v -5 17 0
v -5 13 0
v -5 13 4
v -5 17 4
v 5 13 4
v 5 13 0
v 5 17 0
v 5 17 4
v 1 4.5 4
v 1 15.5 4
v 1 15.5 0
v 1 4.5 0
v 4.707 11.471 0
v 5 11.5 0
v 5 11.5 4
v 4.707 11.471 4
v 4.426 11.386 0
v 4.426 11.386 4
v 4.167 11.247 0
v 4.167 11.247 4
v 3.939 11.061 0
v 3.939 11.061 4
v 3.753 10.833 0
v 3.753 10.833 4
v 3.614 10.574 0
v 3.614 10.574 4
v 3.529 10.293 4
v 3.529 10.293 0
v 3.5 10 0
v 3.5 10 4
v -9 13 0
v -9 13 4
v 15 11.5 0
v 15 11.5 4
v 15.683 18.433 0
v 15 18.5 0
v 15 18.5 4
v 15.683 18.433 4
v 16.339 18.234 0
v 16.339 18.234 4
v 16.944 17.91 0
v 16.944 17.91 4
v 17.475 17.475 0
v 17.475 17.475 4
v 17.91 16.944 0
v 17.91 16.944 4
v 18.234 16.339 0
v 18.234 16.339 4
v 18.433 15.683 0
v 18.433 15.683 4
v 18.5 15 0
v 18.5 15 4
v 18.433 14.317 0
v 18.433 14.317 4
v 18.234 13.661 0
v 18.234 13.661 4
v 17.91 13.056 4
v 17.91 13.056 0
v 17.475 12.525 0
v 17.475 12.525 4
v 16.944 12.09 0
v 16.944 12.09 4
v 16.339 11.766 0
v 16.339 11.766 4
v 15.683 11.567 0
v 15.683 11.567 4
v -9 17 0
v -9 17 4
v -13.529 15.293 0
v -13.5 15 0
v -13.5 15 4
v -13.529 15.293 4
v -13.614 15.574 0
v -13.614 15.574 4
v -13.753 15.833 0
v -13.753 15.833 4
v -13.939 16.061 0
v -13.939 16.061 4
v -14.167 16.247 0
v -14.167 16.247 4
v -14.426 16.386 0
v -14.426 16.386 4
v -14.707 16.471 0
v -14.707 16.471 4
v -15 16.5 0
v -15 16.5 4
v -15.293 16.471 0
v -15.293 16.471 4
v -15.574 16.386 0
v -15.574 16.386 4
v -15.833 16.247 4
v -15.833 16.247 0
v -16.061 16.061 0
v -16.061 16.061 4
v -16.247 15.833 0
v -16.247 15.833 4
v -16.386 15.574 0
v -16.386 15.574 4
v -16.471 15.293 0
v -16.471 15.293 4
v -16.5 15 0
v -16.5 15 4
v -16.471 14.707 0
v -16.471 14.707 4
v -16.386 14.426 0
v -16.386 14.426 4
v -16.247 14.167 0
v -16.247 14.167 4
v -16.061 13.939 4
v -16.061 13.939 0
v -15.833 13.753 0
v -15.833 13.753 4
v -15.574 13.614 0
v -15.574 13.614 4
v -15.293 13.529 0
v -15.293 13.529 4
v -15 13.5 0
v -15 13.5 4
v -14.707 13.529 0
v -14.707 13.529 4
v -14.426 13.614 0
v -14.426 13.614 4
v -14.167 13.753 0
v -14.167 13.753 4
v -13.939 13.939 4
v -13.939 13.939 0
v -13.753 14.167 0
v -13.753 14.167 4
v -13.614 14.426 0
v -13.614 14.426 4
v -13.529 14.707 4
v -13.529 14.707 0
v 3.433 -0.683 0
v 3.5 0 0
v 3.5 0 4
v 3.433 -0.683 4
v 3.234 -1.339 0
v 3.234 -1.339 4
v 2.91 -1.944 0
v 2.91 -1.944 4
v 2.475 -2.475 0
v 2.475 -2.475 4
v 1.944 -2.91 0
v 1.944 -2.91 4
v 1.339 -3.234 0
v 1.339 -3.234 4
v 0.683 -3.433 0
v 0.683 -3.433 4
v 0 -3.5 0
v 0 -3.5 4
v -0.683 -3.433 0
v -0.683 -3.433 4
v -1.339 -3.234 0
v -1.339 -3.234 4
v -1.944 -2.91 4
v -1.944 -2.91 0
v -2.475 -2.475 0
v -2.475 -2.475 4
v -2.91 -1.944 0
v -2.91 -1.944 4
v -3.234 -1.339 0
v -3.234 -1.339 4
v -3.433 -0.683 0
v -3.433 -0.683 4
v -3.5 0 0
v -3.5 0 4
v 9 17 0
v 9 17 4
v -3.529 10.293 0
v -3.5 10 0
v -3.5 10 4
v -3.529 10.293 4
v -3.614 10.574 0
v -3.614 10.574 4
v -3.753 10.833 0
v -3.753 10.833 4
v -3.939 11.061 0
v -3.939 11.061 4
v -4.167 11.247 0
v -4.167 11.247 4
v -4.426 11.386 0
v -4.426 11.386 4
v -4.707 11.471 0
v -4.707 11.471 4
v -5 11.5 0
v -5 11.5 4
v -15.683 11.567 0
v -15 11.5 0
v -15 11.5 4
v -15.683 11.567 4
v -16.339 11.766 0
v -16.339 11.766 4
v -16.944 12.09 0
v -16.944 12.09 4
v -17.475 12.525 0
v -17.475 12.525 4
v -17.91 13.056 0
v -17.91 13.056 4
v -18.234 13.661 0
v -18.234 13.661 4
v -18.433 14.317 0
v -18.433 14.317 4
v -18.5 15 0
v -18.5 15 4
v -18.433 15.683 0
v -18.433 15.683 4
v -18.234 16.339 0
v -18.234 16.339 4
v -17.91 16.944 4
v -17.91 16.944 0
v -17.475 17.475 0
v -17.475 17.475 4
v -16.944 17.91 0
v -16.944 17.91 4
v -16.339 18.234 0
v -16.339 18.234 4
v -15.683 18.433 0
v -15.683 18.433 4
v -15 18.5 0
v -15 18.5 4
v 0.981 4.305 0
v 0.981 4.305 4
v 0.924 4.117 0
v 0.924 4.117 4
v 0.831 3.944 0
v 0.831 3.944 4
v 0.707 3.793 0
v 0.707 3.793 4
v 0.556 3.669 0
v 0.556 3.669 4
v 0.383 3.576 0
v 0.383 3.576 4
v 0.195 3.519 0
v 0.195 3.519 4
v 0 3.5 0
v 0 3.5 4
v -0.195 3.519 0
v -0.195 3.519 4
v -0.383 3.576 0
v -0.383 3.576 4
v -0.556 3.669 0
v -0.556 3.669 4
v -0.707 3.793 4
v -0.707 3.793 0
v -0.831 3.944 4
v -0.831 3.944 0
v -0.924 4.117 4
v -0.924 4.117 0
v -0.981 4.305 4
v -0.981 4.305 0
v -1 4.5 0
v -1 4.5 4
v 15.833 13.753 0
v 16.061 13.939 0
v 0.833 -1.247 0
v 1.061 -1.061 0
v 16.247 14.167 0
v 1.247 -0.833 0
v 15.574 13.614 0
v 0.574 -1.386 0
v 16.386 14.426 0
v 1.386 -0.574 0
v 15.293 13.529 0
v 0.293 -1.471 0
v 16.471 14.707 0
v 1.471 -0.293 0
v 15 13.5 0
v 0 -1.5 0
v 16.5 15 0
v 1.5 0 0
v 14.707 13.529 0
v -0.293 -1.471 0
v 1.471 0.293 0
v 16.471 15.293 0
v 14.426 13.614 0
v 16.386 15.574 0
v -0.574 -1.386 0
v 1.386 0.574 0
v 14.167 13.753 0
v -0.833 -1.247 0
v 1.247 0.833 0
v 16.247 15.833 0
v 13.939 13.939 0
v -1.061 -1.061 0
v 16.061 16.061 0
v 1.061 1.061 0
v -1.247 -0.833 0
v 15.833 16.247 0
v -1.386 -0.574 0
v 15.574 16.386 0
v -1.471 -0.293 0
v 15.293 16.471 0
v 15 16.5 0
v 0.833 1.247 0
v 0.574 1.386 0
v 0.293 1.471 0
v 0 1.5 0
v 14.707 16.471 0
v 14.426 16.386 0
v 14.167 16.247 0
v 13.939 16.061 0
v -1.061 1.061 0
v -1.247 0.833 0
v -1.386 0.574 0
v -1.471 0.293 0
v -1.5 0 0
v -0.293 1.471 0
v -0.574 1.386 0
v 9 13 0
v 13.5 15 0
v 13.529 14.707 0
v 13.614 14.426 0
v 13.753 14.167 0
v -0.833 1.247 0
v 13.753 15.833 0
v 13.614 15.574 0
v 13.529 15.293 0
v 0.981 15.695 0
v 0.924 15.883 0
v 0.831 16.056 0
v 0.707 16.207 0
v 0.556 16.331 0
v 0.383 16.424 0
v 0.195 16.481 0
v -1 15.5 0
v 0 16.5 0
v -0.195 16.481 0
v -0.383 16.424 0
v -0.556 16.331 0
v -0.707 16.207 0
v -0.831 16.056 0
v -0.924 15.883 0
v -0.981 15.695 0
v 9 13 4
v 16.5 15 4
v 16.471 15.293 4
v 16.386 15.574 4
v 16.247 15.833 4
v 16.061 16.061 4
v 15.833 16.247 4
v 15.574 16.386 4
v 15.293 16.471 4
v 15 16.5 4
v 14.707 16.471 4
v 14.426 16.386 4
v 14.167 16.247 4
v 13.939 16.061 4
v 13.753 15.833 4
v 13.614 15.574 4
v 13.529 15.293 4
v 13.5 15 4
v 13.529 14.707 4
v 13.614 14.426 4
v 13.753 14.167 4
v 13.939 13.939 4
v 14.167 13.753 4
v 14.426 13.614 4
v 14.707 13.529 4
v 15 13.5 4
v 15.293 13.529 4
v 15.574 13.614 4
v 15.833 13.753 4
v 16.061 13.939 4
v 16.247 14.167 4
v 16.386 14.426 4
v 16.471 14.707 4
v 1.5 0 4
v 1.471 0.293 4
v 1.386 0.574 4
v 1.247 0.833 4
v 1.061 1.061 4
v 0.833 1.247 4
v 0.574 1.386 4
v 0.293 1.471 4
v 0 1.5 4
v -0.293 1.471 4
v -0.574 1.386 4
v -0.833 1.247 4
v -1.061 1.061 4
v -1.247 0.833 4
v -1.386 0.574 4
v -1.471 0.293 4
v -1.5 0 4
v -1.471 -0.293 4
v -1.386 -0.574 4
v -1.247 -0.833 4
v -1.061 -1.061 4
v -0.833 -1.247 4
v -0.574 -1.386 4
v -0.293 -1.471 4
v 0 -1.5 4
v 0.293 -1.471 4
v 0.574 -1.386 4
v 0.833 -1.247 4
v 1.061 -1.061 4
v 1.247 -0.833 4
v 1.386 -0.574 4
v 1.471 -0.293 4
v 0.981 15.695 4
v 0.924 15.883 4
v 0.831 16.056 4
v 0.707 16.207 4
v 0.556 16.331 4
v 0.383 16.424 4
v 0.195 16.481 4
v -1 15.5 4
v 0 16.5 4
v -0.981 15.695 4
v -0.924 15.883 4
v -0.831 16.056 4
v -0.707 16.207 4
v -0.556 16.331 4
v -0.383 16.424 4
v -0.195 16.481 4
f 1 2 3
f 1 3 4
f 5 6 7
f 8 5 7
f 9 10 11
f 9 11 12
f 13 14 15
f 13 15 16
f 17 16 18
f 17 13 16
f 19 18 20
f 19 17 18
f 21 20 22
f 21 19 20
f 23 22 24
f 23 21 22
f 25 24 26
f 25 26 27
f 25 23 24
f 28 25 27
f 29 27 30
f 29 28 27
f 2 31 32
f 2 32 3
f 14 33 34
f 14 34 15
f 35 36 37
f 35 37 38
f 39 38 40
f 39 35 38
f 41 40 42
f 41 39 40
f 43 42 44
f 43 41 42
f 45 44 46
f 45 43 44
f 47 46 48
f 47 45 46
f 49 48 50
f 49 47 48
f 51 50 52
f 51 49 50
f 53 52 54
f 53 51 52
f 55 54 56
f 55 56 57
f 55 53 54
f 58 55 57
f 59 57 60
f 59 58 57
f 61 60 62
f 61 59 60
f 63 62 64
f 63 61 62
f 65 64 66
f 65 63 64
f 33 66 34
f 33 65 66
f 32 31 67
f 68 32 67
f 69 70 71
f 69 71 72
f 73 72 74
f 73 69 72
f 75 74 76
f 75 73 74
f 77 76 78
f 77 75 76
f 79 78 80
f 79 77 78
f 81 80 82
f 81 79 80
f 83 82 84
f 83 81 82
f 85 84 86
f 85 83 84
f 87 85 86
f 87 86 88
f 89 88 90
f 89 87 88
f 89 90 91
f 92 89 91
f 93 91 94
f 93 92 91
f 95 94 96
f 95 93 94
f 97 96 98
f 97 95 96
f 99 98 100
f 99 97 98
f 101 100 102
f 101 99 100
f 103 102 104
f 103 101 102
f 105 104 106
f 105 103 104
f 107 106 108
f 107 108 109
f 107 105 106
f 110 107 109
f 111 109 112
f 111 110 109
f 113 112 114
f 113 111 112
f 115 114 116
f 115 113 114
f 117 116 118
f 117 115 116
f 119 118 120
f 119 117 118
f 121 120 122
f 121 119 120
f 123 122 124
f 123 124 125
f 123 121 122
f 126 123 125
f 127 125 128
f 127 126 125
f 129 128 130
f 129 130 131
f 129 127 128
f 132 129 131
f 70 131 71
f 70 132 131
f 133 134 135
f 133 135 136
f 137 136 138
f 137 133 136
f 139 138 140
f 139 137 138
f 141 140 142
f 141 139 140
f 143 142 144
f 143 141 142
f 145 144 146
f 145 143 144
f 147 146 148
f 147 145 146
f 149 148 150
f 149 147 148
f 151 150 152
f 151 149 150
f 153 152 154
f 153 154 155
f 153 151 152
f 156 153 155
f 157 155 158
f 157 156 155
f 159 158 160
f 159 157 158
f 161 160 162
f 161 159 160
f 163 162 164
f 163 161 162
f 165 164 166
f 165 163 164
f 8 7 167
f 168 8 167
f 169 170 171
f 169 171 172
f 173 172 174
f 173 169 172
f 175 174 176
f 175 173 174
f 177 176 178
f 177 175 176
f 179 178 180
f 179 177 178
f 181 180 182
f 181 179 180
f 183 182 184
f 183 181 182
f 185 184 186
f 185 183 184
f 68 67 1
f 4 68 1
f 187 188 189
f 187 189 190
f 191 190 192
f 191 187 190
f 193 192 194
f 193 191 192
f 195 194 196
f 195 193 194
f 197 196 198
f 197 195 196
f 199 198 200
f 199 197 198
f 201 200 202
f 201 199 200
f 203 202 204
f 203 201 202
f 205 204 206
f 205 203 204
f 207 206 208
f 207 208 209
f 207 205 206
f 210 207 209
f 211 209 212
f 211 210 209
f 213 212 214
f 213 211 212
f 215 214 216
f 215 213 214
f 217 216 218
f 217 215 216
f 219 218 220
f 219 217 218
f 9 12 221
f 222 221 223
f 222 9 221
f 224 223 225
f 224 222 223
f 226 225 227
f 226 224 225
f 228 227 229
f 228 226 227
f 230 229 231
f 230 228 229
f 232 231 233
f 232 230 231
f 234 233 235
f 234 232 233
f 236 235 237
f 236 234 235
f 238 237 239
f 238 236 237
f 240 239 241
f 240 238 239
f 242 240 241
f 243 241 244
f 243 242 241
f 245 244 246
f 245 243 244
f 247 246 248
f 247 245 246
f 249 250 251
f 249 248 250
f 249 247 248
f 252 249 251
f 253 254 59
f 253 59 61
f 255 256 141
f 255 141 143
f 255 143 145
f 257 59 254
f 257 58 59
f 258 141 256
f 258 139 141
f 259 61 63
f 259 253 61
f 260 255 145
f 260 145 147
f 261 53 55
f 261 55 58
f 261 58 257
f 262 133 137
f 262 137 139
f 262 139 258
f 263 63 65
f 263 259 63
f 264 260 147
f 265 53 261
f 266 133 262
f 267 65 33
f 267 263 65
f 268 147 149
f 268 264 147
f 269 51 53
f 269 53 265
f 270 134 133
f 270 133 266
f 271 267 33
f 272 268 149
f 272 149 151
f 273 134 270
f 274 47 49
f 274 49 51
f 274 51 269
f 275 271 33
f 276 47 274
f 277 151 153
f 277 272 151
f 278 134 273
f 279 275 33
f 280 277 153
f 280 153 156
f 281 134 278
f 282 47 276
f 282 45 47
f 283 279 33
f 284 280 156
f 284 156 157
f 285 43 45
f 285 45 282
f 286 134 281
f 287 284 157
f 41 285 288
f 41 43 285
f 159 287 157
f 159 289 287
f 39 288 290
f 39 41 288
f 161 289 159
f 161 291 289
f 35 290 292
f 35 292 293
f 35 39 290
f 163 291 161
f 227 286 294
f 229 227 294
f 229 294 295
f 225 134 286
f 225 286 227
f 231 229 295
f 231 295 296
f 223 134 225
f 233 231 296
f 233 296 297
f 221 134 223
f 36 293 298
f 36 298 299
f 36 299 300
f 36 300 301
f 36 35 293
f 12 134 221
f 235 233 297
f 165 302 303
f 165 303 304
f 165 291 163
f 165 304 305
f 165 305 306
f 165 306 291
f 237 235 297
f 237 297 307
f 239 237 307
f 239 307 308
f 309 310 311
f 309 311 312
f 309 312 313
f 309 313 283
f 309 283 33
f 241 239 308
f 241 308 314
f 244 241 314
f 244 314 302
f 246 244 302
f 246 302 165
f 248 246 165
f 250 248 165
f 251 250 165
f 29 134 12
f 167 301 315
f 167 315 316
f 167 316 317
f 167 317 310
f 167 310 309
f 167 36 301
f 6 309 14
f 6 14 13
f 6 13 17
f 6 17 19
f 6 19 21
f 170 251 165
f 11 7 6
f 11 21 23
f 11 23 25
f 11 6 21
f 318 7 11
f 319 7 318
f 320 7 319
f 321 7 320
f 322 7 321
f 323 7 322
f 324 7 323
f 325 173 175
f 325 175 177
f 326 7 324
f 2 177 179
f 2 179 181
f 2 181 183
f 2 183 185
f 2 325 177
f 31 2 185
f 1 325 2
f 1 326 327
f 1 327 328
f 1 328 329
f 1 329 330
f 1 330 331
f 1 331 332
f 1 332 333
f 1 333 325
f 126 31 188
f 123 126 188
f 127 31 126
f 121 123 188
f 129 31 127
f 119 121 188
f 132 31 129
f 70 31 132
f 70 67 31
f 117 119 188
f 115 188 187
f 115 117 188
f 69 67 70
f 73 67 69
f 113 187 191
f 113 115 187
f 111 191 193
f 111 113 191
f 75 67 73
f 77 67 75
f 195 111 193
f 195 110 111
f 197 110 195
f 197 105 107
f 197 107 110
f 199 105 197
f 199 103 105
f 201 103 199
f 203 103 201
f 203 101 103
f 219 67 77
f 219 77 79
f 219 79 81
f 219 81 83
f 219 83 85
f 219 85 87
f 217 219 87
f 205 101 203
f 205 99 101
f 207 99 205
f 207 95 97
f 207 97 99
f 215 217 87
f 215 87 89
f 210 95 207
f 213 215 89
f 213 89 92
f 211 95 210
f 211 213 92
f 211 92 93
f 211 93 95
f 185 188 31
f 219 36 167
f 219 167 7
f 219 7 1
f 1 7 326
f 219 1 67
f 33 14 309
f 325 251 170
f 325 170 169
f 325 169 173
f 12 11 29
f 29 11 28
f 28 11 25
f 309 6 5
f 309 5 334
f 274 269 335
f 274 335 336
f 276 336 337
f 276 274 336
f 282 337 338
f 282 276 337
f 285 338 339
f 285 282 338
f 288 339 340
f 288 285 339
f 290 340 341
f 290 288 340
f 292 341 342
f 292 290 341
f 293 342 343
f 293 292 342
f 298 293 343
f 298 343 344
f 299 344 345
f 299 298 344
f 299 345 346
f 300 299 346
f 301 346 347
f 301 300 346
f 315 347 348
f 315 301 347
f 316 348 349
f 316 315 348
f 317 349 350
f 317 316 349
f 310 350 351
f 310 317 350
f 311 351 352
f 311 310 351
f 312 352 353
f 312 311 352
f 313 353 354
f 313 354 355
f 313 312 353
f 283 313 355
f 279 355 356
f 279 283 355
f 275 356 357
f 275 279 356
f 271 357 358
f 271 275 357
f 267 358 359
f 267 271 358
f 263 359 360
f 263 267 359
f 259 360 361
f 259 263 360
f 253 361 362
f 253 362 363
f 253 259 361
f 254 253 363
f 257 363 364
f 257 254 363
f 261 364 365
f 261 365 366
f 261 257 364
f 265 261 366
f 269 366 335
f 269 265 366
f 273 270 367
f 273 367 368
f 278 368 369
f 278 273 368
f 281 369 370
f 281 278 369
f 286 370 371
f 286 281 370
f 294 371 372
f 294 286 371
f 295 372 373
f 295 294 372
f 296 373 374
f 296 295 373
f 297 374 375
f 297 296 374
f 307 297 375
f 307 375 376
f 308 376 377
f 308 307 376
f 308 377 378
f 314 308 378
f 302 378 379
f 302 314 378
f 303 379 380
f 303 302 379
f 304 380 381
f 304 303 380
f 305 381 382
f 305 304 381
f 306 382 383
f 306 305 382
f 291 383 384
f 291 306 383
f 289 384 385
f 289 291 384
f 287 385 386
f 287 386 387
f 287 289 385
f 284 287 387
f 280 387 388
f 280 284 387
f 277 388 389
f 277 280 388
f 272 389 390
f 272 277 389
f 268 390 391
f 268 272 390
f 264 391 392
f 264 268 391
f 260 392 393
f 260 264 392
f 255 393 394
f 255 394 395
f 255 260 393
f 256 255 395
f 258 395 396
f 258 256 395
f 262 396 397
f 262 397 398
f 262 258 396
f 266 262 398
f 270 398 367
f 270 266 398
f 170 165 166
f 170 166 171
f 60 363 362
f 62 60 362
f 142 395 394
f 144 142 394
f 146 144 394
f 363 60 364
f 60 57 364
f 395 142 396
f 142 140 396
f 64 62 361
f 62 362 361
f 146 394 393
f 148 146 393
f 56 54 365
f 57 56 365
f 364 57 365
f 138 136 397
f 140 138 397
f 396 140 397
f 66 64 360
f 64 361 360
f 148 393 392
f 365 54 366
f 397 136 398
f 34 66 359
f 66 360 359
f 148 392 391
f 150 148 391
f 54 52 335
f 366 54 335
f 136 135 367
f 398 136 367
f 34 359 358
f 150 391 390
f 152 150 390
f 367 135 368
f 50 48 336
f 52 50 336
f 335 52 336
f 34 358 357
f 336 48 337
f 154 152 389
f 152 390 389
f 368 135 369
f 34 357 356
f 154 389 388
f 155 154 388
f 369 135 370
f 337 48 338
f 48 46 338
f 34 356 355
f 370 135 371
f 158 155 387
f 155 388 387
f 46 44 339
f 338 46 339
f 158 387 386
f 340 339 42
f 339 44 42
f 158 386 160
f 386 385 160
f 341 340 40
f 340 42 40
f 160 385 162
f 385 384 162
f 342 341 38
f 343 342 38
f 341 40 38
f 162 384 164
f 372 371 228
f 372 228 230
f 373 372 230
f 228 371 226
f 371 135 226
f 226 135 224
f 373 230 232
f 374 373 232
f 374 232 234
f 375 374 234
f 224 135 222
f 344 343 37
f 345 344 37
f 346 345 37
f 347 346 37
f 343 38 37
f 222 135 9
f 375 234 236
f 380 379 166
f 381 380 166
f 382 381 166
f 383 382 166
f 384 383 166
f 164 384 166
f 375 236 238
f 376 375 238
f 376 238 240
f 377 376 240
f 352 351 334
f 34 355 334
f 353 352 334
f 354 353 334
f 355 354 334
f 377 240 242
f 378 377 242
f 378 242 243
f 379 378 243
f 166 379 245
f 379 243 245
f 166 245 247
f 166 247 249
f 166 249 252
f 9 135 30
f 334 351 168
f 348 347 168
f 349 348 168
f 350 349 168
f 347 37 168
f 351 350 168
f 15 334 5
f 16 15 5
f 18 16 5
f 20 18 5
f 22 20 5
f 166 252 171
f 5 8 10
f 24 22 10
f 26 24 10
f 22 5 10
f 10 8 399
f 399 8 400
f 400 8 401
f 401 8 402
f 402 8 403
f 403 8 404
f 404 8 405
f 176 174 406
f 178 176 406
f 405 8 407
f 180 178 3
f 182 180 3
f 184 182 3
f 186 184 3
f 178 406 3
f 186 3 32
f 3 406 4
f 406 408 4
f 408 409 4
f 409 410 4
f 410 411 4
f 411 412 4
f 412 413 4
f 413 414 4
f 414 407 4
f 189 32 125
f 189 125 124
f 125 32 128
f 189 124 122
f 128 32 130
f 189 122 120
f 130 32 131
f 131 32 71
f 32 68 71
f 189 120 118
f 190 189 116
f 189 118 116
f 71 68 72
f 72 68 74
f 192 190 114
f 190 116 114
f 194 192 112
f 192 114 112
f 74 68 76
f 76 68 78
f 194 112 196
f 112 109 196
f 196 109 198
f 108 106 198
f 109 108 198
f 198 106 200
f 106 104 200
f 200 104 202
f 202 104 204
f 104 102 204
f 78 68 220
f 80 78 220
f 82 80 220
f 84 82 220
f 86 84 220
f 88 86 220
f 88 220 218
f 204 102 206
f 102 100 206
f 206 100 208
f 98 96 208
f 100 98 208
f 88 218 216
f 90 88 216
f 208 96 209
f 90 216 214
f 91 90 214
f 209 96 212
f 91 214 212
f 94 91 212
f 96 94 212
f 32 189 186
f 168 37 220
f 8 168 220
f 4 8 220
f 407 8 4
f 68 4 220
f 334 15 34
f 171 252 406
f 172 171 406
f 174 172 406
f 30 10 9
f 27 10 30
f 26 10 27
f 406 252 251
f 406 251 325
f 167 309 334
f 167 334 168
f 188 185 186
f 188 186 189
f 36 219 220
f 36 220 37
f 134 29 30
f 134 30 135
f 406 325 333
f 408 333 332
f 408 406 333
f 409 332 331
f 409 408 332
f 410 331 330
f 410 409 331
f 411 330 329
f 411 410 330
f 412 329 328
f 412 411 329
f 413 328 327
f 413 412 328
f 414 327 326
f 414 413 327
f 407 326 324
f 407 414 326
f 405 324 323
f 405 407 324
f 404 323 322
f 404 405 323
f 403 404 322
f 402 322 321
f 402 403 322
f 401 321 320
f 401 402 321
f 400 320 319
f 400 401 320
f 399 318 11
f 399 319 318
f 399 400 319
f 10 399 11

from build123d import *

# Parameters (mm, degrees)
ESQUISSE1_R             = 1.5
ESQUISSE1_W             = 4
ESQUISSE1_H             = 4
BOSS_EXTRU_1_DEPTH      = 4
ENL_V_MAT_EXTRU_1_REACH = 28.467


with BuildPart() as part:
    # Esquisse1 → Boss.-Extru.1 (new body)
    with BuildSketch(Plane.XY):
        with BuildLine():
            Line((-3.5, 0), (-3.5, 10))
            ThreePointArc((-3.5, 10), (-3.939339828, 11.060660172), (-5, 11.5))
            Line((-5, 11.5), (-15, 11.5))
            ThreePointArc((-15, 11.5), (-18.5, 15), (-15, 18.5))
            Line((-15, 18.5), (15, 18.5))
            ThreePointArc((15, 18.5), (18.5, 15), (15, 11.5))
            Line((15, 11.5), (5, 11.5))
            ThreePointArc((5, 11.5), (3.939339828, 11.060660172), (3.5, 10))
            Line((3.5, 10), (3.5, 0))
            ThreePointArc((3.5, 0), (0, -3.5), (-3.5, 0))
        make_face()
        Circle(ESQUISSE1_R, mode=Mode.SUBTRACT)
        with Locations((-15, 15)):
            Circle(ESQUISSE1_R, mode=Mode.SUBTRACT)
        with Locations((15, 15)):
            Circle(ESQUISSE1_R, mode=Mode.SUBTRACT)
        with Locations((-7, 15)):
            Rectangle(ESQUISSE1_W, ESQUISSE1_H, mode=Mode.SUBTRACT)
        with Locations((7, 15)):
            Rectangle(ESQUISSE1_W, ESQUISSE1_H, mode=Mode.SUBTRACT)
    extrude(amount=BOSS_EXTRU_1_DEPTH)

    # Esquisse2 → Enlèv. mat.-Extru.1 (cut, up to next)
    with BuildSketch(Plane.XY.offset(4), mode=Mode.PRIVATE) as enl_v_mat_extru_1_sk1:
        with BuildLine():
            Line((-1, 4.5), (-1, 15.5))
            ThreePointArc((-1, 15.5), (0, 16.5), (1, 15.5))
            Line((1, 15.5), (1, 4.5))
            ThreePointArc((1, 4.5), (0, 3.5), (-1, 4.5))
        make_face()
    enl_v_mat_extru_1_tool1 = extrude(enl_v_mat_extru_1_sk1.sketch, amount=-ENL_V_MAT_EXTRU_1_REACH, mode=Mode.PRIVATE) & part.part
    add(enl_v_mat_extru_1_tool1.solids().sort_by_distance((0, 10, 4))[0], mode=Mode.SUBTRACT)


solid = part.part
